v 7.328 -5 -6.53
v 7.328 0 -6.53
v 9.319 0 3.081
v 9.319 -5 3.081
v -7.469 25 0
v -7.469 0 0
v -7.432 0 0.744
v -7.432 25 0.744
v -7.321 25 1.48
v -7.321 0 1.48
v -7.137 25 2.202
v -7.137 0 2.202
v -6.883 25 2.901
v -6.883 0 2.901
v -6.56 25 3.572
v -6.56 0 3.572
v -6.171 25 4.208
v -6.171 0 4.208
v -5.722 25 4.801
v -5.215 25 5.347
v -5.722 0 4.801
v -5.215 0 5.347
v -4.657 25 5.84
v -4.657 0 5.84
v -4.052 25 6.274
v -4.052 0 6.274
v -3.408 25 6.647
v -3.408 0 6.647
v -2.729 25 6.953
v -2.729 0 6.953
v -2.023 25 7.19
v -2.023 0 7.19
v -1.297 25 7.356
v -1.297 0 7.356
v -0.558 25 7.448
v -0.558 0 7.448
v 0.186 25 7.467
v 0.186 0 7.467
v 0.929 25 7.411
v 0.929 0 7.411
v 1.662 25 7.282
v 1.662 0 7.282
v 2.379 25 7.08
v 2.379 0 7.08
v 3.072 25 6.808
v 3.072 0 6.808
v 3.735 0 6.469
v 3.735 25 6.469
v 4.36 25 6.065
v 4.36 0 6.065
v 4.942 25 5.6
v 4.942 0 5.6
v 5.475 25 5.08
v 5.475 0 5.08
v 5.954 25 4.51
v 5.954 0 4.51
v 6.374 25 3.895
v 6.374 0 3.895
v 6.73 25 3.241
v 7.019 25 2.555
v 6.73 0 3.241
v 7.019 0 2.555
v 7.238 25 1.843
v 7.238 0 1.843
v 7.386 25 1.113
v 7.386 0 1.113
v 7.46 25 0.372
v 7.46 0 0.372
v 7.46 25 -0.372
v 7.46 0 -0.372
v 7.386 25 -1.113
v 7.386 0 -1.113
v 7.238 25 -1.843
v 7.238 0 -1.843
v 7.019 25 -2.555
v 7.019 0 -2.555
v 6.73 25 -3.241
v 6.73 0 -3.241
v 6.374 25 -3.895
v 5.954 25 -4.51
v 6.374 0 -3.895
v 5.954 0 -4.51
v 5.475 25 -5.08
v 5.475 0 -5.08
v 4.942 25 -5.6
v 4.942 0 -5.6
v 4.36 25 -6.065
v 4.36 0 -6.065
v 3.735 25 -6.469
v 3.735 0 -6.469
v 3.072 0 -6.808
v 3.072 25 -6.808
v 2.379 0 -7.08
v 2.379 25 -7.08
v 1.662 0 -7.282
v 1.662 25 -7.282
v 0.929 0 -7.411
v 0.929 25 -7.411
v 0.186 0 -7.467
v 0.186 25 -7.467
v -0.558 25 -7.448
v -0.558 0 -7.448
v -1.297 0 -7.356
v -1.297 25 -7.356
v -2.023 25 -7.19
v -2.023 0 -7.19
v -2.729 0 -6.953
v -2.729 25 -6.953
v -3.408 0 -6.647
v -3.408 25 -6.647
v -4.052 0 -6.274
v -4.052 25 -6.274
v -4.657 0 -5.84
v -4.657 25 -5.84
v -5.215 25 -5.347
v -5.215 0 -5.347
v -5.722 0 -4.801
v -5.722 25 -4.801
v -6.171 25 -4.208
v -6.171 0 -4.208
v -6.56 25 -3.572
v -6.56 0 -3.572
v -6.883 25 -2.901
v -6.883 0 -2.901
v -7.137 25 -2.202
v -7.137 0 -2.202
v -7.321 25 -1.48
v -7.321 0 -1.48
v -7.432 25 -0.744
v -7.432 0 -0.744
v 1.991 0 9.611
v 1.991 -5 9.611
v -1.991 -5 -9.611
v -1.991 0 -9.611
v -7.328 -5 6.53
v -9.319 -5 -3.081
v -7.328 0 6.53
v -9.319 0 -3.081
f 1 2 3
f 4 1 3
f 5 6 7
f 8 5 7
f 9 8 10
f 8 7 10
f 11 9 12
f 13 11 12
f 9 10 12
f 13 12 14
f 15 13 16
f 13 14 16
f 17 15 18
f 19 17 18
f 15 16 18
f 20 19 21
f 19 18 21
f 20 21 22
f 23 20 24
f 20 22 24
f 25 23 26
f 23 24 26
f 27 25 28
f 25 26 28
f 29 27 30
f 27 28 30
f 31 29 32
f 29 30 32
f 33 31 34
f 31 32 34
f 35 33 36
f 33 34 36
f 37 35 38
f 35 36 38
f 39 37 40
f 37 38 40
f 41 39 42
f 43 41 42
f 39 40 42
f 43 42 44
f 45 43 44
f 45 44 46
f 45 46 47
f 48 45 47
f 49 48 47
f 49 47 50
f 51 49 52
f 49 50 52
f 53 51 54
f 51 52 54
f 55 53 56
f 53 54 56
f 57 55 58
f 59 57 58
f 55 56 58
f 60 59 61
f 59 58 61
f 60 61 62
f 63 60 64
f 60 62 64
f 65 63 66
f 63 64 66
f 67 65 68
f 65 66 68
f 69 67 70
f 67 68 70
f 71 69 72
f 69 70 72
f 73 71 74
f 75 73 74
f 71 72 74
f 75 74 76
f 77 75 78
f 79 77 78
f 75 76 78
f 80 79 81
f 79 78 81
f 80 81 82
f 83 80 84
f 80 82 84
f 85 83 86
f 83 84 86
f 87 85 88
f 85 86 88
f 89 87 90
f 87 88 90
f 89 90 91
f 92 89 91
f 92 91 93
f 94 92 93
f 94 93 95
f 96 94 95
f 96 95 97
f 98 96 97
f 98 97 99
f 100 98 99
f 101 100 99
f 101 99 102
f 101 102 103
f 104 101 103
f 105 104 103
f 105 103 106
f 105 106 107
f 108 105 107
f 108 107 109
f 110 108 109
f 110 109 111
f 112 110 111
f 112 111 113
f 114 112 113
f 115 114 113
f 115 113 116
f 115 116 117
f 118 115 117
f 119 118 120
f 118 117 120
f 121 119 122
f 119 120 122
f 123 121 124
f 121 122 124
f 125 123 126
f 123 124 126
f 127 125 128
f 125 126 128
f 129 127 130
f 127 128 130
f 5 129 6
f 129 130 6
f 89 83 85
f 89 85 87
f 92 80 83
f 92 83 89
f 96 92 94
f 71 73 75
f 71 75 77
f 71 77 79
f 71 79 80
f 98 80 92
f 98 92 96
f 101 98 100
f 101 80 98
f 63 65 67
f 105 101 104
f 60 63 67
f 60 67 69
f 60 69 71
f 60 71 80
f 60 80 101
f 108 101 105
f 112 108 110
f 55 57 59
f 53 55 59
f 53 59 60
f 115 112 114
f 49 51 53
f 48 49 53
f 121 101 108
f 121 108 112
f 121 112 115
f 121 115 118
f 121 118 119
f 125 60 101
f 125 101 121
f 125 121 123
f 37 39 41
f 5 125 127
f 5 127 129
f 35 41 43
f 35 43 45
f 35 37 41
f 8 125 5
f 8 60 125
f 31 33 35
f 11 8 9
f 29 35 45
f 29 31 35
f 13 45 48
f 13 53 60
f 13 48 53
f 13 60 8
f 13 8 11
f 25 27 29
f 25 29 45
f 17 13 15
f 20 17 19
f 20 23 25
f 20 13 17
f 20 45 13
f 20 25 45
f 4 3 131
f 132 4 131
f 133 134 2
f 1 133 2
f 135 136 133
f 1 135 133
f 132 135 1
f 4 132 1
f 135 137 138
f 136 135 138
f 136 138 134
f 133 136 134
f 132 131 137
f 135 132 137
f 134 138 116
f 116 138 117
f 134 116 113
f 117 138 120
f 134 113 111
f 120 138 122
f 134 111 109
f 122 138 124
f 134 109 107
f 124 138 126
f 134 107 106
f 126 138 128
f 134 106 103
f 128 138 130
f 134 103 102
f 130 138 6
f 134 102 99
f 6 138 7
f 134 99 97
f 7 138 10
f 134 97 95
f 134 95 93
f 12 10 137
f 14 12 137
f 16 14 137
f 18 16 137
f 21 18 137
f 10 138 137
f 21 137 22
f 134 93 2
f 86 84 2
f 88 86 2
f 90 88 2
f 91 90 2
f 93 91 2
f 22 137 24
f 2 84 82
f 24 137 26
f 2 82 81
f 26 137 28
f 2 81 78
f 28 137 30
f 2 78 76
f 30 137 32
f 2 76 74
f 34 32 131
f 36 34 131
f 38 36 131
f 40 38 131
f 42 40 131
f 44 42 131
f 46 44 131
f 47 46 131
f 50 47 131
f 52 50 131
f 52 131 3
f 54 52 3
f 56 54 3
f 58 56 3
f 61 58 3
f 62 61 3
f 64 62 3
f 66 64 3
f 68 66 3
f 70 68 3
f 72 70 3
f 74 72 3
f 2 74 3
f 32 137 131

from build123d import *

# Parameters (mm, degrees)
F1_DEPTH = 5
F2_R     = 7.46933
F3_DEPTH = 25


with BuildPart() as f1:
    # F0 (on Front) → F1 (new body)
    with BuildSketch(Plane.XZ):
        Polygon((9.318711, 3.08139), (1.990793, 9.610935), (-7.327917, 6.529545), (-9.318711, -3.08139), (-1.990793, -9.610935), (7.327917, -6.529545), align=None)
    extrude(amount=F1_DEPTH)

    # F2 (on face) → F3 (join)
    with BuildSketch(Plane(origin=(0, 0, 0), x_dir=(-1, 0, 0), z_dir=(0, 1, 0))):
        Circle(F2_R)
    extrude(amount=F3_DEPTH)


solid = f1.part
